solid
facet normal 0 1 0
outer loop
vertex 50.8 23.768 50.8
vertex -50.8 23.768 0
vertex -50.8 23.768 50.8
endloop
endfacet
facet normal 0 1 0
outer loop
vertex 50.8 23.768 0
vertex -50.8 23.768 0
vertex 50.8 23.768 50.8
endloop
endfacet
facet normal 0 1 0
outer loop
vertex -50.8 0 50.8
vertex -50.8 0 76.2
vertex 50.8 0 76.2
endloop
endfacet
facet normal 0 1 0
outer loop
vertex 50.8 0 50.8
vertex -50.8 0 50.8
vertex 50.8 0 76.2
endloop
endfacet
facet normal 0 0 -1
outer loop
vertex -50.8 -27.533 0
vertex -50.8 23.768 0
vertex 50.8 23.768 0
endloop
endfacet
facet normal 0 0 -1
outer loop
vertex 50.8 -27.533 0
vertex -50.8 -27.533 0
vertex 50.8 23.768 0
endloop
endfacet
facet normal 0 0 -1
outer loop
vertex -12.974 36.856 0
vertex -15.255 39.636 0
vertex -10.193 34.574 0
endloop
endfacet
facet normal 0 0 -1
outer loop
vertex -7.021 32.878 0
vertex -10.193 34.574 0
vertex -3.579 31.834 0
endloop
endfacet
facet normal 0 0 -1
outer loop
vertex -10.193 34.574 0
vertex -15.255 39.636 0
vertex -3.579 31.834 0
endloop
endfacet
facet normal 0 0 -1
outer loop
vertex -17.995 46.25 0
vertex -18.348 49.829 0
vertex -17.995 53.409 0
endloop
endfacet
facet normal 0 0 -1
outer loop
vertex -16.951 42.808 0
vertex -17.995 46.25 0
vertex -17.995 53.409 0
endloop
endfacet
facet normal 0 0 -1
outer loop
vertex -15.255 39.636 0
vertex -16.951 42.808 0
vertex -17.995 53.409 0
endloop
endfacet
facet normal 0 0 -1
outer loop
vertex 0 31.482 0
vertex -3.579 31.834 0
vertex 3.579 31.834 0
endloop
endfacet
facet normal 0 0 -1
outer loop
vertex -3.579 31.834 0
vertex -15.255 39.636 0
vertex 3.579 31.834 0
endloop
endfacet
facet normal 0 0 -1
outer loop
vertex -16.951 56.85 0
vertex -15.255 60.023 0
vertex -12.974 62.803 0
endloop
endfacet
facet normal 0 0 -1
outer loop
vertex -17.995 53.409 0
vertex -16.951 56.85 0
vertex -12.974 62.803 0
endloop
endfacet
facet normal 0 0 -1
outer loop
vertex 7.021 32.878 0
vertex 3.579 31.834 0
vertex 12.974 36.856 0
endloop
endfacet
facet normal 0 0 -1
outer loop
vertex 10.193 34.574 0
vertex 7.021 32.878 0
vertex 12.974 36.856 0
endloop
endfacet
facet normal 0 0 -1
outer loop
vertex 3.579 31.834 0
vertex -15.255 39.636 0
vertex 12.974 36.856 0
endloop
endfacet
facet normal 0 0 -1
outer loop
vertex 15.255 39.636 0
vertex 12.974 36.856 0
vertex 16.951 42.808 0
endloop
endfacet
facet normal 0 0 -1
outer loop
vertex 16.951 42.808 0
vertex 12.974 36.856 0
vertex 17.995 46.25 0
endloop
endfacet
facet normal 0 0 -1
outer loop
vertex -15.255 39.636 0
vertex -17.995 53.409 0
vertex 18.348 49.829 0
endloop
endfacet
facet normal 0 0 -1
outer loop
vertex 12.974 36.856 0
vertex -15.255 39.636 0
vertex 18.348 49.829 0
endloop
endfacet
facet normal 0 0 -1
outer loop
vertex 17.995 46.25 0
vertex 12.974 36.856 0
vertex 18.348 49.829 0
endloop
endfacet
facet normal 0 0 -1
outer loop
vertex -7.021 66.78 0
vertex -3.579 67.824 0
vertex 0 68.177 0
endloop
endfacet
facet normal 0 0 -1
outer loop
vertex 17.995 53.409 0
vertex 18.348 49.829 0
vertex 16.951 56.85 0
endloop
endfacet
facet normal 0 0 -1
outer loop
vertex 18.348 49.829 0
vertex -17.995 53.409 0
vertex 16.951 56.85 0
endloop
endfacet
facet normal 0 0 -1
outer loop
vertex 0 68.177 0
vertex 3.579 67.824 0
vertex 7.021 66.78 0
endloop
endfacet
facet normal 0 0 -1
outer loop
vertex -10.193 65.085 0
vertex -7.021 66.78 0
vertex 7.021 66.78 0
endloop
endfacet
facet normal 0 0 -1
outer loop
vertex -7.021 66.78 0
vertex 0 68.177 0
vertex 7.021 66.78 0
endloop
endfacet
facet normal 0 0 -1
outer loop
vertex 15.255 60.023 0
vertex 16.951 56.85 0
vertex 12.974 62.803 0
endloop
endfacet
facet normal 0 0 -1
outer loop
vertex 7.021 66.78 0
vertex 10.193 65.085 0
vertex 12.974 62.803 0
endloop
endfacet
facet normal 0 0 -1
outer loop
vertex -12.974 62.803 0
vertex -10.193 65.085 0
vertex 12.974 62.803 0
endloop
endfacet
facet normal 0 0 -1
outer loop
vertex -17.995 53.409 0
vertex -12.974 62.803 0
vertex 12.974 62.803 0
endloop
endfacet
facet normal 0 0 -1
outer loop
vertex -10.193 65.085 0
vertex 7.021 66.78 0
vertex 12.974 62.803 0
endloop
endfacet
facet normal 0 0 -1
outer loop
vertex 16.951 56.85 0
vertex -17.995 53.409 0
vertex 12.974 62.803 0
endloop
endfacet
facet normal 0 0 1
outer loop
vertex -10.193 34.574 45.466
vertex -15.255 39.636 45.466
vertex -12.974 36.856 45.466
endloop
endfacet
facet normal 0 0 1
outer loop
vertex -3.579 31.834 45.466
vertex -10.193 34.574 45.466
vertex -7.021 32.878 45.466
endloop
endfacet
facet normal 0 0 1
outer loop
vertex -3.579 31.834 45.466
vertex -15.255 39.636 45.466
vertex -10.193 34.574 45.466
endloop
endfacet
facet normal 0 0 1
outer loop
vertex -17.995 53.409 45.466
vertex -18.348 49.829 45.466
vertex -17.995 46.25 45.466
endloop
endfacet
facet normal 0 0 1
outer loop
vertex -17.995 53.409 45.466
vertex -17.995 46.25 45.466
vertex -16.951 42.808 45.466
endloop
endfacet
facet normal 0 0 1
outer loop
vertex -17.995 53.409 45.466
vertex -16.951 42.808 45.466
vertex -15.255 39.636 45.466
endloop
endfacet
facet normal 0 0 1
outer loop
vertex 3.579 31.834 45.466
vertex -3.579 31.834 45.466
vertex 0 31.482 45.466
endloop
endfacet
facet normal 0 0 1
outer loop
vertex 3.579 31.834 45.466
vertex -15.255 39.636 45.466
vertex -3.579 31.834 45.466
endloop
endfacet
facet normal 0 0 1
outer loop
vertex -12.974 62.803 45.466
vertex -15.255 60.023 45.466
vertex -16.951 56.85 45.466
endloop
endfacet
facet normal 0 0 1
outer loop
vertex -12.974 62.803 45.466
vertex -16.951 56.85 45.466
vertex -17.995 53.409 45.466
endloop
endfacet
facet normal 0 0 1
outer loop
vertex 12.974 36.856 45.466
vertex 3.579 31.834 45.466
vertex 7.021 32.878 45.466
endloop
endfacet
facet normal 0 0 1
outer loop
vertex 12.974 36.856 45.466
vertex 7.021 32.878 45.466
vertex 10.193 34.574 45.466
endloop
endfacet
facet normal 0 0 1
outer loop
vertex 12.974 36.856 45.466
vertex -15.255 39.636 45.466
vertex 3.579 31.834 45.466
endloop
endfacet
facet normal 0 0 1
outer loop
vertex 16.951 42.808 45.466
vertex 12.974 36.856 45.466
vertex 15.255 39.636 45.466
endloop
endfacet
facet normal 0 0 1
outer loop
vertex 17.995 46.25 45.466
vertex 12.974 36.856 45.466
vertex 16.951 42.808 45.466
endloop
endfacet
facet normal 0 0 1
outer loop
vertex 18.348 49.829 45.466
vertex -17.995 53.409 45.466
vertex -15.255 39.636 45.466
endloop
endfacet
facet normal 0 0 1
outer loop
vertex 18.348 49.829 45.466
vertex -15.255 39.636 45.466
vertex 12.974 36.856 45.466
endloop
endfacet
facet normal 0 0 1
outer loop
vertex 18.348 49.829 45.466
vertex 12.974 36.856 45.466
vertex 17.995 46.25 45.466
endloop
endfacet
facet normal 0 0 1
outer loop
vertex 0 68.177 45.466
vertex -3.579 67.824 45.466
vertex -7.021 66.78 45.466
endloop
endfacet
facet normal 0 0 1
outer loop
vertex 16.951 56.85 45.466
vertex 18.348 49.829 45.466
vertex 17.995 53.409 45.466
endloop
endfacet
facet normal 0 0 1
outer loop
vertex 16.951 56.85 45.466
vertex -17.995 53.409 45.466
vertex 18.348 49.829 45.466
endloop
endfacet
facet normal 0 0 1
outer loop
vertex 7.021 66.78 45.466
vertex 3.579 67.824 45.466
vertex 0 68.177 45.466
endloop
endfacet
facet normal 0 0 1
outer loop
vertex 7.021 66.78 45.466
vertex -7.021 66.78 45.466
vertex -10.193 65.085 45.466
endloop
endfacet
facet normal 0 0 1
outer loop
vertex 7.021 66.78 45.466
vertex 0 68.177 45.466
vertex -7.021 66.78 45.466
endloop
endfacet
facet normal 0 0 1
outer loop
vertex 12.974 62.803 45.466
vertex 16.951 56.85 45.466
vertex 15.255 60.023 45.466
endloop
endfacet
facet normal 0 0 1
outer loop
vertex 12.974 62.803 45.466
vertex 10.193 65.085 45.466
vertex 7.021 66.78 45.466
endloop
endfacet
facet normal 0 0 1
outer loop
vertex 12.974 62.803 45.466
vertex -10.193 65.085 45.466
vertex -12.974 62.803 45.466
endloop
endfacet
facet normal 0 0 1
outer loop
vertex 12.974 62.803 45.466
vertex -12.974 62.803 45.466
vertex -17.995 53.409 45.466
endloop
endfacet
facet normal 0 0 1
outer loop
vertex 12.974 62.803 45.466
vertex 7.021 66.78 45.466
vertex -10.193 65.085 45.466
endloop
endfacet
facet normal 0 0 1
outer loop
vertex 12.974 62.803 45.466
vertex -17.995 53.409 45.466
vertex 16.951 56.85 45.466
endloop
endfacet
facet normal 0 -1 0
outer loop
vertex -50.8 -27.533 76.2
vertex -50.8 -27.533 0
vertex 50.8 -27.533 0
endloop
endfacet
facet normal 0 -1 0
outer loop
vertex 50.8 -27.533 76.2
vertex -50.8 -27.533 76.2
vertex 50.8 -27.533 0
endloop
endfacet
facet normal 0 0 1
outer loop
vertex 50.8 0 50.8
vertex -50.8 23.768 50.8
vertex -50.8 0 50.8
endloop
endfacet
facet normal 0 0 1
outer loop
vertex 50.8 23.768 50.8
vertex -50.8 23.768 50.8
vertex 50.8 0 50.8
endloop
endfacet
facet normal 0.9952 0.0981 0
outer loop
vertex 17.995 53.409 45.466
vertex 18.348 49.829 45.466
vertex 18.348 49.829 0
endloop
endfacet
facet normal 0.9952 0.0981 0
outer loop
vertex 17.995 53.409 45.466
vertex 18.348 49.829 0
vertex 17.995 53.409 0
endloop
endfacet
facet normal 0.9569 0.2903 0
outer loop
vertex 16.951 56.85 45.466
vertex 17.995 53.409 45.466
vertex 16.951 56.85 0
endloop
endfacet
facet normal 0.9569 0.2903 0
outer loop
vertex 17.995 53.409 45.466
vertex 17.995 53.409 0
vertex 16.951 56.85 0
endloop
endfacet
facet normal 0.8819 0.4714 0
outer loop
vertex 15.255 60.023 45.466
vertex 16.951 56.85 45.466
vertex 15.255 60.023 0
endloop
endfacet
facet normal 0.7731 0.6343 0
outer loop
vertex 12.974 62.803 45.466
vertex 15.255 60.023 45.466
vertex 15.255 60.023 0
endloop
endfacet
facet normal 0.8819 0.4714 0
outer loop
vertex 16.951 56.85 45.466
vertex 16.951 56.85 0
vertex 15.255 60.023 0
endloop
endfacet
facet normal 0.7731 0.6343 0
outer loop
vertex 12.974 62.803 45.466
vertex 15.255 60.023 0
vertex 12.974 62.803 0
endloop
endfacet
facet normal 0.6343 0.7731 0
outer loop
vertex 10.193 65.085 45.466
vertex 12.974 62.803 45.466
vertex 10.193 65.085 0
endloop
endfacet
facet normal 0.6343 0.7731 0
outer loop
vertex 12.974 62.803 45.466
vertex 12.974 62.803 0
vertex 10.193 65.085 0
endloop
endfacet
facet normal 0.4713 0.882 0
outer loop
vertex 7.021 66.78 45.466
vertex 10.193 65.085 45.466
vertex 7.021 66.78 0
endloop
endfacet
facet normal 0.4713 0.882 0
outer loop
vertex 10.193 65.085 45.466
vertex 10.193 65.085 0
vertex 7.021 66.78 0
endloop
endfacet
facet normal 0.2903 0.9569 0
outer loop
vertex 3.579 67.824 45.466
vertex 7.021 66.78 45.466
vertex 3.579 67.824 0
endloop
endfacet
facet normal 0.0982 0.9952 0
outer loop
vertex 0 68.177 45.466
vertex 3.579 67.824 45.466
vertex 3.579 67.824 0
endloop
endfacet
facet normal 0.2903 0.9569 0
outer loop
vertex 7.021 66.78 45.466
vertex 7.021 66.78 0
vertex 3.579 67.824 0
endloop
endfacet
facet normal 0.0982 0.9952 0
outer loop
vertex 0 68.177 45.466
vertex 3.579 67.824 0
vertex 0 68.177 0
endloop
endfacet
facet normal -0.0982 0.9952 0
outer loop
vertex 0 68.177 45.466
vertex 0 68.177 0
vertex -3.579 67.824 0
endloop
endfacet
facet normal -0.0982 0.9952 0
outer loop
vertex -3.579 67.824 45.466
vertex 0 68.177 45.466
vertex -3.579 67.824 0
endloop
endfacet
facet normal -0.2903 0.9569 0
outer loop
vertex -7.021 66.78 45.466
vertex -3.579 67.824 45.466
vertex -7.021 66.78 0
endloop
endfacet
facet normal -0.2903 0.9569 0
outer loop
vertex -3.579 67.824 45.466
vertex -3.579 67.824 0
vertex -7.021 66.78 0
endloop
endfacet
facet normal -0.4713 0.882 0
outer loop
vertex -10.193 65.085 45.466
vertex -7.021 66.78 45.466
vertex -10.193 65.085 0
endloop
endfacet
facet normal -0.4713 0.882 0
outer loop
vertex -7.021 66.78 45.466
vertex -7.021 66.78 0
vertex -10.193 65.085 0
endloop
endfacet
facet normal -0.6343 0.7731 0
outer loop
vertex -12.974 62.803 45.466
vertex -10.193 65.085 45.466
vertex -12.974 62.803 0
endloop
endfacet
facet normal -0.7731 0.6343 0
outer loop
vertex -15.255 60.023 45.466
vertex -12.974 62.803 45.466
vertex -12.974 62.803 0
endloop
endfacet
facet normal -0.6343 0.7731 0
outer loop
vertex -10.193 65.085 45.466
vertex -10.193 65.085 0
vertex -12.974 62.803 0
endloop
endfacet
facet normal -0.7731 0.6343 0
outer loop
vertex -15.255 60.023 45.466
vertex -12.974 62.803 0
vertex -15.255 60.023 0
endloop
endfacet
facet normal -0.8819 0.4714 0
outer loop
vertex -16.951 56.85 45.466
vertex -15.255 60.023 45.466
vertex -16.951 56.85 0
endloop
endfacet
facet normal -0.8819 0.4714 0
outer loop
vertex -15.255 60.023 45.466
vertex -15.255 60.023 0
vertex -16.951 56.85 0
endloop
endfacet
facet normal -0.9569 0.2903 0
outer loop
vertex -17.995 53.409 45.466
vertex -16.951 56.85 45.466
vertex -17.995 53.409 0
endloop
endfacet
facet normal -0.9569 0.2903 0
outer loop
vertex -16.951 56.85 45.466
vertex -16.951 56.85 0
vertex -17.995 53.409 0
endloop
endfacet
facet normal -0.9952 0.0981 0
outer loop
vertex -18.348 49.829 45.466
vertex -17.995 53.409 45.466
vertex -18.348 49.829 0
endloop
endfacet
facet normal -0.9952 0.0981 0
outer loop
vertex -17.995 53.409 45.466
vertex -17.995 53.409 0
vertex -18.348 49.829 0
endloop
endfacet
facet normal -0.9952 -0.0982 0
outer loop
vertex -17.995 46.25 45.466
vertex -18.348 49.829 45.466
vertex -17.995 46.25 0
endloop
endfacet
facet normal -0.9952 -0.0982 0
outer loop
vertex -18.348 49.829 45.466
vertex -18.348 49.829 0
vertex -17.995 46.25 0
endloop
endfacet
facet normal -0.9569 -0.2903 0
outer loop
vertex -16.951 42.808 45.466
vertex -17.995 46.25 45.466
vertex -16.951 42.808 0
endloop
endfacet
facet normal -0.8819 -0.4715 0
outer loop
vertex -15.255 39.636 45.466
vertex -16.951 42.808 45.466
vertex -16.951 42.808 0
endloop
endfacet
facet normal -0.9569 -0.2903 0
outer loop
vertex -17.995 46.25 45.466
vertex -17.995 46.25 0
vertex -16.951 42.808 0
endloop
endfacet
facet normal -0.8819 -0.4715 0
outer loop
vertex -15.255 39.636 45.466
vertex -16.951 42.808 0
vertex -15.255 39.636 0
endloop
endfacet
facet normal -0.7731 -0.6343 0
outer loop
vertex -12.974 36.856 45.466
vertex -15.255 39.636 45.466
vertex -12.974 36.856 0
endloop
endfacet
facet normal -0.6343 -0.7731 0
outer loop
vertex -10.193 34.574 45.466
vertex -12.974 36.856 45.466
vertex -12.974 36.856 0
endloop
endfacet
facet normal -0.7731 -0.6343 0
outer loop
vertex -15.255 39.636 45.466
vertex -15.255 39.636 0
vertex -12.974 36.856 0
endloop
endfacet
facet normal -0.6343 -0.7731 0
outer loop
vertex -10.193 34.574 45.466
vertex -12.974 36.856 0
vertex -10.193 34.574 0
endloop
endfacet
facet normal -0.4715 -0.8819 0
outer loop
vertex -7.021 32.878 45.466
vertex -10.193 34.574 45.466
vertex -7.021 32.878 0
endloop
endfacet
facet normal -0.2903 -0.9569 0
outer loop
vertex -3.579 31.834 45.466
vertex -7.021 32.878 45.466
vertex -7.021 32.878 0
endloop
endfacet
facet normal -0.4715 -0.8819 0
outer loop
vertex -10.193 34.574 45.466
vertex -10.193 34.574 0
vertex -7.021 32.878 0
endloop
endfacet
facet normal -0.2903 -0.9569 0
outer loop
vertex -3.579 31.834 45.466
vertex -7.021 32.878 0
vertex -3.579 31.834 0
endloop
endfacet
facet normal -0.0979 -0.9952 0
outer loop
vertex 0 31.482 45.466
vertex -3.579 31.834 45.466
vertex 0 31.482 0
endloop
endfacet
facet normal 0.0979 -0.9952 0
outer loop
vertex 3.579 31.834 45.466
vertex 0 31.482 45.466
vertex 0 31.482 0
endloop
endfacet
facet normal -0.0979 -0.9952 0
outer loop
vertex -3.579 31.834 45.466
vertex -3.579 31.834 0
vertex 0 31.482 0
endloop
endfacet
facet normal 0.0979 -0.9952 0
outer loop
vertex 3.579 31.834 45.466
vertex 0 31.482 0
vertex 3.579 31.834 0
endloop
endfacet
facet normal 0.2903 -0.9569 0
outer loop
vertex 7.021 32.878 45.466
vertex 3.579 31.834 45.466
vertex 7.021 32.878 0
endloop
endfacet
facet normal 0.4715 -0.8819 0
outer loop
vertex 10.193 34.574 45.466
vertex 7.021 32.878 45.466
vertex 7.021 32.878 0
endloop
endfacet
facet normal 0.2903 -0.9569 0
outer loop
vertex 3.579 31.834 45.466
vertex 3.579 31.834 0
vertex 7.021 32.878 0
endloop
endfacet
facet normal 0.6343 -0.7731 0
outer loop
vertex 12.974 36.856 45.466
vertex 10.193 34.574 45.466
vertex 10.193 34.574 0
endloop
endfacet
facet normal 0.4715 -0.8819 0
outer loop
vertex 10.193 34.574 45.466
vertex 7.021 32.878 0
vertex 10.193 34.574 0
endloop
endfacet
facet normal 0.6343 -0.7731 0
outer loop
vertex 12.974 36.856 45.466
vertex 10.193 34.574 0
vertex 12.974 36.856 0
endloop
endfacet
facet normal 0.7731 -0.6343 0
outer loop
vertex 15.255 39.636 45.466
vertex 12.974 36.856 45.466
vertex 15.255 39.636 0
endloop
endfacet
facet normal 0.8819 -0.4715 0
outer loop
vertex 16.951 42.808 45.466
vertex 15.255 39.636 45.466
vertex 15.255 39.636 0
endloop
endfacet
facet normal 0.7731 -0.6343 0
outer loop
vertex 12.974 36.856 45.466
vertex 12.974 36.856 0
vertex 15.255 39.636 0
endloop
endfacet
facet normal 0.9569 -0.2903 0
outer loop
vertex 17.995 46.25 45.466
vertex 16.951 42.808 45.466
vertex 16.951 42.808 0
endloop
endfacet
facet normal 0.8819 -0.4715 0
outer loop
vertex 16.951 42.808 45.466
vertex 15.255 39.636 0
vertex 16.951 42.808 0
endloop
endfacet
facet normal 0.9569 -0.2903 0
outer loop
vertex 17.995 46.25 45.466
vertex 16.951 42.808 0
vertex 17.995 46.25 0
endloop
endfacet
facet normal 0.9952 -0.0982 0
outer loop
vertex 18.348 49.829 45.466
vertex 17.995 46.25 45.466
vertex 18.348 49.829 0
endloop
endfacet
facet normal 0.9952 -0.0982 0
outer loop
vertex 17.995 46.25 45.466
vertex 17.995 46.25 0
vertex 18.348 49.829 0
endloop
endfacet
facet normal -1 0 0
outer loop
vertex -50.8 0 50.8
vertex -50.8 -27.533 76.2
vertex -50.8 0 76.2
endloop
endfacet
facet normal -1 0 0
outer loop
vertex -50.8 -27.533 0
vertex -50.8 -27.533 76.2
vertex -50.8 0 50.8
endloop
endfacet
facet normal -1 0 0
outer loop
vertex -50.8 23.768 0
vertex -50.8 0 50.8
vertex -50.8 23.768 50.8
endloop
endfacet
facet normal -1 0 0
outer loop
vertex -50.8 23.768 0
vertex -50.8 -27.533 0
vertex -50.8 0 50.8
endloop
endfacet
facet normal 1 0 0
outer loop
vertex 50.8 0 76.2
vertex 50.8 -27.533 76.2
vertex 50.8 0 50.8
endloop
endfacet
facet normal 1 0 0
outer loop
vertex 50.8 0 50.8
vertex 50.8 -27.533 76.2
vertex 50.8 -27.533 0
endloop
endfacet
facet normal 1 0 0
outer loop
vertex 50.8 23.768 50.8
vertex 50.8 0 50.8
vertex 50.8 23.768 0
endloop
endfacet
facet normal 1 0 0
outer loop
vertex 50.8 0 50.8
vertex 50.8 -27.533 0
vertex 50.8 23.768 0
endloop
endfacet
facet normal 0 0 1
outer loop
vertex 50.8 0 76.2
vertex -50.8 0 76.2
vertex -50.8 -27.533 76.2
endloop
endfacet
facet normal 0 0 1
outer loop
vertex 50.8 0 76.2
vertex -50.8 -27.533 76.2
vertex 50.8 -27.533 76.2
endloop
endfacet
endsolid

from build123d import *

# Parameters (mm, degrees)
F0_W     = 101.6
F0_H     = 51.300529
F1_DEPTH = 76.2
F2_W     = 101.6
F2_H     = 23.767676
F3_DEPTH = 25.4
F4_R     = 18.347513
F5_DEPTH = 45.466


with BuildPart() as f1:
    # F0 (on Top) → F1 (new body)
    with BuildSketch(Plane.XY):
        with Locations((0, -1.882589)):
            Rectangle(F0_W, F0_H)
    extrude(amount=F1_DEPTH)

    # F2 (on face) → F3 (cut)
    with BuildSketch(Plane.XY.offset(76.2)):
        with Locations((0, 11.883838)):
            Rectangle(F2_W, F2_H)
    extrude(amount=-F3_DEPTH, mode=Mode.SUBTRACT)


with BuildPart() as f5:
    # F4 (on Top) → F5 (new body)
    with BuildSketch(Plane.XY):
        with Locations((0, 49.829185)):
            Circle(F4_R)
    extrude(amount=F5_DEPTH)


solid = Compound([f1.part, f5.part])
